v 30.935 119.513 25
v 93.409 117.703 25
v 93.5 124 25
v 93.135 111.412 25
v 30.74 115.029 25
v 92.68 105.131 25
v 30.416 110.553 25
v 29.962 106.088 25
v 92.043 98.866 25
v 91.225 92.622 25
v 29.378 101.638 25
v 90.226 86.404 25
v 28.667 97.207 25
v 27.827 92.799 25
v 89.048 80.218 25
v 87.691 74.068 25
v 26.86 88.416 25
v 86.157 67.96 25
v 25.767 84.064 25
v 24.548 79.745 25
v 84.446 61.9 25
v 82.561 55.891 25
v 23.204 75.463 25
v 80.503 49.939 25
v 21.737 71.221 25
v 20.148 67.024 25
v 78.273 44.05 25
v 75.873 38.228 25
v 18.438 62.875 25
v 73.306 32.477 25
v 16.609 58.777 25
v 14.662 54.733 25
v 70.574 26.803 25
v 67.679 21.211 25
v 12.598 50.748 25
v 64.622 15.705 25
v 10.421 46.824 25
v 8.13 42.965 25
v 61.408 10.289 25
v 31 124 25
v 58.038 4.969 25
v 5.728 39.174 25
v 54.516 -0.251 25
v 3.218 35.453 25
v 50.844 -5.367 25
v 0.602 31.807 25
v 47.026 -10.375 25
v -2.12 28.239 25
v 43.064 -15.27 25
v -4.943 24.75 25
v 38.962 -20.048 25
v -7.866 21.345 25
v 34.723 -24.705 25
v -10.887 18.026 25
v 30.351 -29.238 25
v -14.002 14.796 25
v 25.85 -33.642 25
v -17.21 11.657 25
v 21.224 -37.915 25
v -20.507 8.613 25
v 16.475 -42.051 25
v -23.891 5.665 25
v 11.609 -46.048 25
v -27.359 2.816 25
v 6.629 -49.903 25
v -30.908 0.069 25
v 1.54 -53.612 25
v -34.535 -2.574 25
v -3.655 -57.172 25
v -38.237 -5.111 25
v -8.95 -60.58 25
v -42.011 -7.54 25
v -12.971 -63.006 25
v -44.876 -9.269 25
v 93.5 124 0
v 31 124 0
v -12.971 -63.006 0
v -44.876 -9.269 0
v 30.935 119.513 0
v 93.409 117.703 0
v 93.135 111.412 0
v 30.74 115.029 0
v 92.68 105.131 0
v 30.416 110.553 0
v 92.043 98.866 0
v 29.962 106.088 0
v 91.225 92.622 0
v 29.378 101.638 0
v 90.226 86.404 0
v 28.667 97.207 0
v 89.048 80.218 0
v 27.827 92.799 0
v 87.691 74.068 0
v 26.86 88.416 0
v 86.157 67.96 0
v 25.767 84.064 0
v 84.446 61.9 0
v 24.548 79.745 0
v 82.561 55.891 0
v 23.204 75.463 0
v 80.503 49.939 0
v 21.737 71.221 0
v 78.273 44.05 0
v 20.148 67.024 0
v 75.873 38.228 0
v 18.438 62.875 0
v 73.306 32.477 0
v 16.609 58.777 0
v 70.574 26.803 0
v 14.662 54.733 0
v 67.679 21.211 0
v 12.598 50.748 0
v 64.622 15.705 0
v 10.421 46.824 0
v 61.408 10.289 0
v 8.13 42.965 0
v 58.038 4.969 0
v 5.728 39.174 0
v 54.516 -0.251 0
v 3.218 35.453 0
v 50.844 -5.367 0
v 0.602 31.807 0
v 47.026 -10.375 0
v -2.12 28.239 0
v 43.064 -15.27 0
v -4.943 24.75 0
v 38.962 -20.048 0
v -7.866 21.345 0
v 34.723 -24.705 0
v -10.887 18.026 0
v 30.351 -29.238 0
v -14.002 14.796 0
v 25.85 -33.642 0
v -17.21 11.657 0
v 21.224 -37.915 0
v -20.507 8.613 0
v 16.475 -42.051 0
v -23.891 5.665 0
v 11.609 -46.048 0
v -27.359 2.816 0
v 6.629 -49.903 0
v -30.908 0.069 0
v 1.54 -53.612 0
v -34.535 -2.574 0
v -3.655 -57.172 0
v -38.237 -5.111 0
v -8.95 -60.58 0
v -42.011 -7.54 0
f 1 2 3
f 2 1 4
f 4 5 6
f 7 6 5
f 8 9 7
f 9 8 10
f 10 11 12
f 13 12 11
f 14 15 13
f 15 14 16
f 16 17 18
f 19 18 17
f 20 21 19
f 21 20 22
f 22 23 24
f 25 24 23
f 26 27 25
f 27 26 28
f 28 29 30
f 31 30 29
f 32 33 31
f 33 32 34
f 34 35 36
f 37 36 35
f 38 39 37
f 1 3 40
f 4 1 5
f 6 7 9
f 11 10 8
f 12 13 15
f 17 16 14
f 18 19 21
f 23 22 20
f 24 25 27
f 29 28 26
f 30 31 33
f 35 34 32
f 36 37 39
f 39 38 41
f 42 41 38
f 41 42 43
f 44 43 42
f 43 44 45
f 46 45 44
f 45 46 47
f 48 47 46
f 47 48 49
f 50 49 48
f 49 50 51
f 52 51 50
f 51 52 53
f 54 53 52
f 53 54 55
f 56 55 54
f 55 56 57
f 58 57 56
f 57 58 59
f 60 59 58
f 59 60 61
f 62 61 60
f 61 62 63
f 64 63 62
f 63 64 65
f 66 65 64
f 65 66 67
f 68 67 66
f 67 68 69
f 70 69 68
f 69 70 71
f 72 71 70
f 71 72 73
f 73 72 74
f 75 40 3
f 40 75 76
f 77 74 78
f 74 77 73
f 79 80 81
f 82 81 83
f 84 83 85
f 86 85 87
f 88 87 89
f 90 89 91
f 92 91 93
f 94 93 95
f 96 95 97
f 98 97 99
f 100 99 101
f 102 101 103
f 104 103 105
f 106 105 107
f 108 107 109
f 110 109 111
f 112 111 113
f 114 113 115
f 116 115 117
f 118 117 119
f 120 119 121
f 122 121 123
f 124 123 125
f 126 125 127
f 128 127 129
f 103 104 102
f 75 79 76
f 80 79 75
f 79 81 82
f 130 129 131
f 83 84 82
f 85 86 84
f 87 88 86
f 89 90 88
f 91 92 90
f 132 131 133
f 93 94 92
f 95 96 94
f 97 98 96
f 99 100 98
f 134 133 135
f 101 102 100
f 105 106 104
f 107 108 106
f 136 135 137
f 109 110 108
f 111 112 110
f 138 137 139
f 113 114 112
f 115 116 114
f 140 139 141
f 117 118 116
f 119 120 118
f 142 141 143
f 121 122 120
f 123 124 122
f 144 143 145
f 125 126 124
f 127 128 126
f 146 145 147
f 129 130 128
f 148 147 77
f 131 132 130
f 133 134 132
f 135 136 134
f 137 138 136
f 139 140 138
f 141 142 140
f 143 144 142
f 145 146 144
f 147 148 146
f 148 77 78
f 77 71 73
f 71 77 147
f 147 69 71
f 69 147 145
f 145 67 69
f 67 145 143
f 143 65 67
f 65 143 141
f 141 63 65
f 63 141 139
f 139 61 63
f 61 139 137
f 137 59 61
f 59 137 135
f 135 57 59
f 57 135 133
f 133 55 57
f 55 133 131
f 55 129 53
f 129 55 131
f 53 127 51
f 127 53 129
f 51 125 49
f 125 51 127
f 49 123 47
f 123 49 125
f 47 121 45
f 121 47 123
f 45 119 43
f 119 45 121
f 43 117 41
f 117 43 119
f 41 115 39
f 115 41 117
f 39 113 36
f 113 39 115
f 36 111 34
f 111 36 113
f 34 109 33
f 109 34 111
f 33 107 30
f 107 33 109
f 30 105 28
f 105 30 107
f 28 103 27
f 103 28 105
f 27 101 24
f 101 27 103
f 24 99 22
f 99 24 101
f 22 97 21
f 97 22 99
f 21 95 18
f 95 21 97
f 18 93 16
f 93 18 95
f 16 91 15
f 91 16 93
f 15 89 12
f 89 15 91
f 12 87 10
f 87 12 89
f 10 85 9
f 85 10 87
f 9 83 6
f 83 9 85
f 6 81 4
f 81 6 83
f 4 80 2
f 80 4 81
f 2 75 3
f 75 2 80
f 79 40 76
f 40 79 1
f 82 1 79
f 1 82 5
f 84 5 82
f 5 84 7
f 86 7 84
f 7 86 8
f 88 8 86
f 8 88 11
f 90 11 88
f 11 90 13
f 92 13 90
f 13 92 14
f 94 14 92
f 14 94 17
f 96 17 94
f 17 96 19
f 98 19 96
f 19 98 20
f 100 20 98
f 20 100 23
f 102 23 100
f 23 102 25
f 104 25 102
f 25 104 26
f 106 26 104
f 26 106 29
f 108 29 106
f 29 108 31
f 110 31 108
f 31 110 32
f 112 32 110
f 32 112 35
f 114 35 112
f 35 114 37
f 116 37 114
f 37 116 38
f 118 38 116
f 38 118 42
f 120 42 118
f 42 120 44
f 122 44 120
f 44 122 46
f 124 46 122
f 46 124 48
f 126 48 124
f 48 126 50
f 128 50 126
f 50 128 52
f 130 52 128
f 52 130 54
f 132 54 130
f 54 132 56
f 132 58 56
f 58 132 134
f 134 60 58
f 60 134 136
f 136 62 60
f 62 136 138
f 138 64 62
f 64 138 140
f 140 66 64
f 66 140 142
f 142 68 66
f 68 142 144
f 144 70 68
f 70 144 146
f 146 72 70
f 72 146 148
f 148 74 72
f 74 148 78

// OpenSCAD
//Height of the tray lip
tray_height = 25;
//The outside diameter of the circle this needs to fit.
outer_diameter = 435;
//The inside diameter of the circle this is supposed to fit.
inner_diameter = 310;
//How long should the outside edge of the tray slice be?
length_of_outside_edge = 225;

outer_circ = outer_diameter*3.14;
slice_percentage = (length_of_outside_edge/outer_circ);

slice_final_block_rotation = 360 - (90 + (360*slice_percentage));
slice_block_size = [outer_diameter*.6,outer_diameter*.6,tray_height*1.2];

translate([inner_diameter*-.4,inner_diameter*.4,0])
difference()
{	
	//Draw a donut of the apropriate dimensions
	linear_extrude(height = tray_height) 
		difference()
		{
			circle((outer_diameter/2),$fn=outer_diameter/2);
			circle((inner_diameter/2),$fn=outer_diameter/2);
		}
	
	//Subtract a group of blocks from it.
	translate([0,0,tray_height*-.2])// Drop the cut blocks slightly below Z=0
		union()
		{
			cube(slice_block_size);
			for(i=[45:45:slice_final_block_rotation])
			{
				rotate([0,0,i])cube(slice_block_size);
			}
			rotate([0,0,slice_final_block_rotation])cube(slice_block_size);
		}
}	
